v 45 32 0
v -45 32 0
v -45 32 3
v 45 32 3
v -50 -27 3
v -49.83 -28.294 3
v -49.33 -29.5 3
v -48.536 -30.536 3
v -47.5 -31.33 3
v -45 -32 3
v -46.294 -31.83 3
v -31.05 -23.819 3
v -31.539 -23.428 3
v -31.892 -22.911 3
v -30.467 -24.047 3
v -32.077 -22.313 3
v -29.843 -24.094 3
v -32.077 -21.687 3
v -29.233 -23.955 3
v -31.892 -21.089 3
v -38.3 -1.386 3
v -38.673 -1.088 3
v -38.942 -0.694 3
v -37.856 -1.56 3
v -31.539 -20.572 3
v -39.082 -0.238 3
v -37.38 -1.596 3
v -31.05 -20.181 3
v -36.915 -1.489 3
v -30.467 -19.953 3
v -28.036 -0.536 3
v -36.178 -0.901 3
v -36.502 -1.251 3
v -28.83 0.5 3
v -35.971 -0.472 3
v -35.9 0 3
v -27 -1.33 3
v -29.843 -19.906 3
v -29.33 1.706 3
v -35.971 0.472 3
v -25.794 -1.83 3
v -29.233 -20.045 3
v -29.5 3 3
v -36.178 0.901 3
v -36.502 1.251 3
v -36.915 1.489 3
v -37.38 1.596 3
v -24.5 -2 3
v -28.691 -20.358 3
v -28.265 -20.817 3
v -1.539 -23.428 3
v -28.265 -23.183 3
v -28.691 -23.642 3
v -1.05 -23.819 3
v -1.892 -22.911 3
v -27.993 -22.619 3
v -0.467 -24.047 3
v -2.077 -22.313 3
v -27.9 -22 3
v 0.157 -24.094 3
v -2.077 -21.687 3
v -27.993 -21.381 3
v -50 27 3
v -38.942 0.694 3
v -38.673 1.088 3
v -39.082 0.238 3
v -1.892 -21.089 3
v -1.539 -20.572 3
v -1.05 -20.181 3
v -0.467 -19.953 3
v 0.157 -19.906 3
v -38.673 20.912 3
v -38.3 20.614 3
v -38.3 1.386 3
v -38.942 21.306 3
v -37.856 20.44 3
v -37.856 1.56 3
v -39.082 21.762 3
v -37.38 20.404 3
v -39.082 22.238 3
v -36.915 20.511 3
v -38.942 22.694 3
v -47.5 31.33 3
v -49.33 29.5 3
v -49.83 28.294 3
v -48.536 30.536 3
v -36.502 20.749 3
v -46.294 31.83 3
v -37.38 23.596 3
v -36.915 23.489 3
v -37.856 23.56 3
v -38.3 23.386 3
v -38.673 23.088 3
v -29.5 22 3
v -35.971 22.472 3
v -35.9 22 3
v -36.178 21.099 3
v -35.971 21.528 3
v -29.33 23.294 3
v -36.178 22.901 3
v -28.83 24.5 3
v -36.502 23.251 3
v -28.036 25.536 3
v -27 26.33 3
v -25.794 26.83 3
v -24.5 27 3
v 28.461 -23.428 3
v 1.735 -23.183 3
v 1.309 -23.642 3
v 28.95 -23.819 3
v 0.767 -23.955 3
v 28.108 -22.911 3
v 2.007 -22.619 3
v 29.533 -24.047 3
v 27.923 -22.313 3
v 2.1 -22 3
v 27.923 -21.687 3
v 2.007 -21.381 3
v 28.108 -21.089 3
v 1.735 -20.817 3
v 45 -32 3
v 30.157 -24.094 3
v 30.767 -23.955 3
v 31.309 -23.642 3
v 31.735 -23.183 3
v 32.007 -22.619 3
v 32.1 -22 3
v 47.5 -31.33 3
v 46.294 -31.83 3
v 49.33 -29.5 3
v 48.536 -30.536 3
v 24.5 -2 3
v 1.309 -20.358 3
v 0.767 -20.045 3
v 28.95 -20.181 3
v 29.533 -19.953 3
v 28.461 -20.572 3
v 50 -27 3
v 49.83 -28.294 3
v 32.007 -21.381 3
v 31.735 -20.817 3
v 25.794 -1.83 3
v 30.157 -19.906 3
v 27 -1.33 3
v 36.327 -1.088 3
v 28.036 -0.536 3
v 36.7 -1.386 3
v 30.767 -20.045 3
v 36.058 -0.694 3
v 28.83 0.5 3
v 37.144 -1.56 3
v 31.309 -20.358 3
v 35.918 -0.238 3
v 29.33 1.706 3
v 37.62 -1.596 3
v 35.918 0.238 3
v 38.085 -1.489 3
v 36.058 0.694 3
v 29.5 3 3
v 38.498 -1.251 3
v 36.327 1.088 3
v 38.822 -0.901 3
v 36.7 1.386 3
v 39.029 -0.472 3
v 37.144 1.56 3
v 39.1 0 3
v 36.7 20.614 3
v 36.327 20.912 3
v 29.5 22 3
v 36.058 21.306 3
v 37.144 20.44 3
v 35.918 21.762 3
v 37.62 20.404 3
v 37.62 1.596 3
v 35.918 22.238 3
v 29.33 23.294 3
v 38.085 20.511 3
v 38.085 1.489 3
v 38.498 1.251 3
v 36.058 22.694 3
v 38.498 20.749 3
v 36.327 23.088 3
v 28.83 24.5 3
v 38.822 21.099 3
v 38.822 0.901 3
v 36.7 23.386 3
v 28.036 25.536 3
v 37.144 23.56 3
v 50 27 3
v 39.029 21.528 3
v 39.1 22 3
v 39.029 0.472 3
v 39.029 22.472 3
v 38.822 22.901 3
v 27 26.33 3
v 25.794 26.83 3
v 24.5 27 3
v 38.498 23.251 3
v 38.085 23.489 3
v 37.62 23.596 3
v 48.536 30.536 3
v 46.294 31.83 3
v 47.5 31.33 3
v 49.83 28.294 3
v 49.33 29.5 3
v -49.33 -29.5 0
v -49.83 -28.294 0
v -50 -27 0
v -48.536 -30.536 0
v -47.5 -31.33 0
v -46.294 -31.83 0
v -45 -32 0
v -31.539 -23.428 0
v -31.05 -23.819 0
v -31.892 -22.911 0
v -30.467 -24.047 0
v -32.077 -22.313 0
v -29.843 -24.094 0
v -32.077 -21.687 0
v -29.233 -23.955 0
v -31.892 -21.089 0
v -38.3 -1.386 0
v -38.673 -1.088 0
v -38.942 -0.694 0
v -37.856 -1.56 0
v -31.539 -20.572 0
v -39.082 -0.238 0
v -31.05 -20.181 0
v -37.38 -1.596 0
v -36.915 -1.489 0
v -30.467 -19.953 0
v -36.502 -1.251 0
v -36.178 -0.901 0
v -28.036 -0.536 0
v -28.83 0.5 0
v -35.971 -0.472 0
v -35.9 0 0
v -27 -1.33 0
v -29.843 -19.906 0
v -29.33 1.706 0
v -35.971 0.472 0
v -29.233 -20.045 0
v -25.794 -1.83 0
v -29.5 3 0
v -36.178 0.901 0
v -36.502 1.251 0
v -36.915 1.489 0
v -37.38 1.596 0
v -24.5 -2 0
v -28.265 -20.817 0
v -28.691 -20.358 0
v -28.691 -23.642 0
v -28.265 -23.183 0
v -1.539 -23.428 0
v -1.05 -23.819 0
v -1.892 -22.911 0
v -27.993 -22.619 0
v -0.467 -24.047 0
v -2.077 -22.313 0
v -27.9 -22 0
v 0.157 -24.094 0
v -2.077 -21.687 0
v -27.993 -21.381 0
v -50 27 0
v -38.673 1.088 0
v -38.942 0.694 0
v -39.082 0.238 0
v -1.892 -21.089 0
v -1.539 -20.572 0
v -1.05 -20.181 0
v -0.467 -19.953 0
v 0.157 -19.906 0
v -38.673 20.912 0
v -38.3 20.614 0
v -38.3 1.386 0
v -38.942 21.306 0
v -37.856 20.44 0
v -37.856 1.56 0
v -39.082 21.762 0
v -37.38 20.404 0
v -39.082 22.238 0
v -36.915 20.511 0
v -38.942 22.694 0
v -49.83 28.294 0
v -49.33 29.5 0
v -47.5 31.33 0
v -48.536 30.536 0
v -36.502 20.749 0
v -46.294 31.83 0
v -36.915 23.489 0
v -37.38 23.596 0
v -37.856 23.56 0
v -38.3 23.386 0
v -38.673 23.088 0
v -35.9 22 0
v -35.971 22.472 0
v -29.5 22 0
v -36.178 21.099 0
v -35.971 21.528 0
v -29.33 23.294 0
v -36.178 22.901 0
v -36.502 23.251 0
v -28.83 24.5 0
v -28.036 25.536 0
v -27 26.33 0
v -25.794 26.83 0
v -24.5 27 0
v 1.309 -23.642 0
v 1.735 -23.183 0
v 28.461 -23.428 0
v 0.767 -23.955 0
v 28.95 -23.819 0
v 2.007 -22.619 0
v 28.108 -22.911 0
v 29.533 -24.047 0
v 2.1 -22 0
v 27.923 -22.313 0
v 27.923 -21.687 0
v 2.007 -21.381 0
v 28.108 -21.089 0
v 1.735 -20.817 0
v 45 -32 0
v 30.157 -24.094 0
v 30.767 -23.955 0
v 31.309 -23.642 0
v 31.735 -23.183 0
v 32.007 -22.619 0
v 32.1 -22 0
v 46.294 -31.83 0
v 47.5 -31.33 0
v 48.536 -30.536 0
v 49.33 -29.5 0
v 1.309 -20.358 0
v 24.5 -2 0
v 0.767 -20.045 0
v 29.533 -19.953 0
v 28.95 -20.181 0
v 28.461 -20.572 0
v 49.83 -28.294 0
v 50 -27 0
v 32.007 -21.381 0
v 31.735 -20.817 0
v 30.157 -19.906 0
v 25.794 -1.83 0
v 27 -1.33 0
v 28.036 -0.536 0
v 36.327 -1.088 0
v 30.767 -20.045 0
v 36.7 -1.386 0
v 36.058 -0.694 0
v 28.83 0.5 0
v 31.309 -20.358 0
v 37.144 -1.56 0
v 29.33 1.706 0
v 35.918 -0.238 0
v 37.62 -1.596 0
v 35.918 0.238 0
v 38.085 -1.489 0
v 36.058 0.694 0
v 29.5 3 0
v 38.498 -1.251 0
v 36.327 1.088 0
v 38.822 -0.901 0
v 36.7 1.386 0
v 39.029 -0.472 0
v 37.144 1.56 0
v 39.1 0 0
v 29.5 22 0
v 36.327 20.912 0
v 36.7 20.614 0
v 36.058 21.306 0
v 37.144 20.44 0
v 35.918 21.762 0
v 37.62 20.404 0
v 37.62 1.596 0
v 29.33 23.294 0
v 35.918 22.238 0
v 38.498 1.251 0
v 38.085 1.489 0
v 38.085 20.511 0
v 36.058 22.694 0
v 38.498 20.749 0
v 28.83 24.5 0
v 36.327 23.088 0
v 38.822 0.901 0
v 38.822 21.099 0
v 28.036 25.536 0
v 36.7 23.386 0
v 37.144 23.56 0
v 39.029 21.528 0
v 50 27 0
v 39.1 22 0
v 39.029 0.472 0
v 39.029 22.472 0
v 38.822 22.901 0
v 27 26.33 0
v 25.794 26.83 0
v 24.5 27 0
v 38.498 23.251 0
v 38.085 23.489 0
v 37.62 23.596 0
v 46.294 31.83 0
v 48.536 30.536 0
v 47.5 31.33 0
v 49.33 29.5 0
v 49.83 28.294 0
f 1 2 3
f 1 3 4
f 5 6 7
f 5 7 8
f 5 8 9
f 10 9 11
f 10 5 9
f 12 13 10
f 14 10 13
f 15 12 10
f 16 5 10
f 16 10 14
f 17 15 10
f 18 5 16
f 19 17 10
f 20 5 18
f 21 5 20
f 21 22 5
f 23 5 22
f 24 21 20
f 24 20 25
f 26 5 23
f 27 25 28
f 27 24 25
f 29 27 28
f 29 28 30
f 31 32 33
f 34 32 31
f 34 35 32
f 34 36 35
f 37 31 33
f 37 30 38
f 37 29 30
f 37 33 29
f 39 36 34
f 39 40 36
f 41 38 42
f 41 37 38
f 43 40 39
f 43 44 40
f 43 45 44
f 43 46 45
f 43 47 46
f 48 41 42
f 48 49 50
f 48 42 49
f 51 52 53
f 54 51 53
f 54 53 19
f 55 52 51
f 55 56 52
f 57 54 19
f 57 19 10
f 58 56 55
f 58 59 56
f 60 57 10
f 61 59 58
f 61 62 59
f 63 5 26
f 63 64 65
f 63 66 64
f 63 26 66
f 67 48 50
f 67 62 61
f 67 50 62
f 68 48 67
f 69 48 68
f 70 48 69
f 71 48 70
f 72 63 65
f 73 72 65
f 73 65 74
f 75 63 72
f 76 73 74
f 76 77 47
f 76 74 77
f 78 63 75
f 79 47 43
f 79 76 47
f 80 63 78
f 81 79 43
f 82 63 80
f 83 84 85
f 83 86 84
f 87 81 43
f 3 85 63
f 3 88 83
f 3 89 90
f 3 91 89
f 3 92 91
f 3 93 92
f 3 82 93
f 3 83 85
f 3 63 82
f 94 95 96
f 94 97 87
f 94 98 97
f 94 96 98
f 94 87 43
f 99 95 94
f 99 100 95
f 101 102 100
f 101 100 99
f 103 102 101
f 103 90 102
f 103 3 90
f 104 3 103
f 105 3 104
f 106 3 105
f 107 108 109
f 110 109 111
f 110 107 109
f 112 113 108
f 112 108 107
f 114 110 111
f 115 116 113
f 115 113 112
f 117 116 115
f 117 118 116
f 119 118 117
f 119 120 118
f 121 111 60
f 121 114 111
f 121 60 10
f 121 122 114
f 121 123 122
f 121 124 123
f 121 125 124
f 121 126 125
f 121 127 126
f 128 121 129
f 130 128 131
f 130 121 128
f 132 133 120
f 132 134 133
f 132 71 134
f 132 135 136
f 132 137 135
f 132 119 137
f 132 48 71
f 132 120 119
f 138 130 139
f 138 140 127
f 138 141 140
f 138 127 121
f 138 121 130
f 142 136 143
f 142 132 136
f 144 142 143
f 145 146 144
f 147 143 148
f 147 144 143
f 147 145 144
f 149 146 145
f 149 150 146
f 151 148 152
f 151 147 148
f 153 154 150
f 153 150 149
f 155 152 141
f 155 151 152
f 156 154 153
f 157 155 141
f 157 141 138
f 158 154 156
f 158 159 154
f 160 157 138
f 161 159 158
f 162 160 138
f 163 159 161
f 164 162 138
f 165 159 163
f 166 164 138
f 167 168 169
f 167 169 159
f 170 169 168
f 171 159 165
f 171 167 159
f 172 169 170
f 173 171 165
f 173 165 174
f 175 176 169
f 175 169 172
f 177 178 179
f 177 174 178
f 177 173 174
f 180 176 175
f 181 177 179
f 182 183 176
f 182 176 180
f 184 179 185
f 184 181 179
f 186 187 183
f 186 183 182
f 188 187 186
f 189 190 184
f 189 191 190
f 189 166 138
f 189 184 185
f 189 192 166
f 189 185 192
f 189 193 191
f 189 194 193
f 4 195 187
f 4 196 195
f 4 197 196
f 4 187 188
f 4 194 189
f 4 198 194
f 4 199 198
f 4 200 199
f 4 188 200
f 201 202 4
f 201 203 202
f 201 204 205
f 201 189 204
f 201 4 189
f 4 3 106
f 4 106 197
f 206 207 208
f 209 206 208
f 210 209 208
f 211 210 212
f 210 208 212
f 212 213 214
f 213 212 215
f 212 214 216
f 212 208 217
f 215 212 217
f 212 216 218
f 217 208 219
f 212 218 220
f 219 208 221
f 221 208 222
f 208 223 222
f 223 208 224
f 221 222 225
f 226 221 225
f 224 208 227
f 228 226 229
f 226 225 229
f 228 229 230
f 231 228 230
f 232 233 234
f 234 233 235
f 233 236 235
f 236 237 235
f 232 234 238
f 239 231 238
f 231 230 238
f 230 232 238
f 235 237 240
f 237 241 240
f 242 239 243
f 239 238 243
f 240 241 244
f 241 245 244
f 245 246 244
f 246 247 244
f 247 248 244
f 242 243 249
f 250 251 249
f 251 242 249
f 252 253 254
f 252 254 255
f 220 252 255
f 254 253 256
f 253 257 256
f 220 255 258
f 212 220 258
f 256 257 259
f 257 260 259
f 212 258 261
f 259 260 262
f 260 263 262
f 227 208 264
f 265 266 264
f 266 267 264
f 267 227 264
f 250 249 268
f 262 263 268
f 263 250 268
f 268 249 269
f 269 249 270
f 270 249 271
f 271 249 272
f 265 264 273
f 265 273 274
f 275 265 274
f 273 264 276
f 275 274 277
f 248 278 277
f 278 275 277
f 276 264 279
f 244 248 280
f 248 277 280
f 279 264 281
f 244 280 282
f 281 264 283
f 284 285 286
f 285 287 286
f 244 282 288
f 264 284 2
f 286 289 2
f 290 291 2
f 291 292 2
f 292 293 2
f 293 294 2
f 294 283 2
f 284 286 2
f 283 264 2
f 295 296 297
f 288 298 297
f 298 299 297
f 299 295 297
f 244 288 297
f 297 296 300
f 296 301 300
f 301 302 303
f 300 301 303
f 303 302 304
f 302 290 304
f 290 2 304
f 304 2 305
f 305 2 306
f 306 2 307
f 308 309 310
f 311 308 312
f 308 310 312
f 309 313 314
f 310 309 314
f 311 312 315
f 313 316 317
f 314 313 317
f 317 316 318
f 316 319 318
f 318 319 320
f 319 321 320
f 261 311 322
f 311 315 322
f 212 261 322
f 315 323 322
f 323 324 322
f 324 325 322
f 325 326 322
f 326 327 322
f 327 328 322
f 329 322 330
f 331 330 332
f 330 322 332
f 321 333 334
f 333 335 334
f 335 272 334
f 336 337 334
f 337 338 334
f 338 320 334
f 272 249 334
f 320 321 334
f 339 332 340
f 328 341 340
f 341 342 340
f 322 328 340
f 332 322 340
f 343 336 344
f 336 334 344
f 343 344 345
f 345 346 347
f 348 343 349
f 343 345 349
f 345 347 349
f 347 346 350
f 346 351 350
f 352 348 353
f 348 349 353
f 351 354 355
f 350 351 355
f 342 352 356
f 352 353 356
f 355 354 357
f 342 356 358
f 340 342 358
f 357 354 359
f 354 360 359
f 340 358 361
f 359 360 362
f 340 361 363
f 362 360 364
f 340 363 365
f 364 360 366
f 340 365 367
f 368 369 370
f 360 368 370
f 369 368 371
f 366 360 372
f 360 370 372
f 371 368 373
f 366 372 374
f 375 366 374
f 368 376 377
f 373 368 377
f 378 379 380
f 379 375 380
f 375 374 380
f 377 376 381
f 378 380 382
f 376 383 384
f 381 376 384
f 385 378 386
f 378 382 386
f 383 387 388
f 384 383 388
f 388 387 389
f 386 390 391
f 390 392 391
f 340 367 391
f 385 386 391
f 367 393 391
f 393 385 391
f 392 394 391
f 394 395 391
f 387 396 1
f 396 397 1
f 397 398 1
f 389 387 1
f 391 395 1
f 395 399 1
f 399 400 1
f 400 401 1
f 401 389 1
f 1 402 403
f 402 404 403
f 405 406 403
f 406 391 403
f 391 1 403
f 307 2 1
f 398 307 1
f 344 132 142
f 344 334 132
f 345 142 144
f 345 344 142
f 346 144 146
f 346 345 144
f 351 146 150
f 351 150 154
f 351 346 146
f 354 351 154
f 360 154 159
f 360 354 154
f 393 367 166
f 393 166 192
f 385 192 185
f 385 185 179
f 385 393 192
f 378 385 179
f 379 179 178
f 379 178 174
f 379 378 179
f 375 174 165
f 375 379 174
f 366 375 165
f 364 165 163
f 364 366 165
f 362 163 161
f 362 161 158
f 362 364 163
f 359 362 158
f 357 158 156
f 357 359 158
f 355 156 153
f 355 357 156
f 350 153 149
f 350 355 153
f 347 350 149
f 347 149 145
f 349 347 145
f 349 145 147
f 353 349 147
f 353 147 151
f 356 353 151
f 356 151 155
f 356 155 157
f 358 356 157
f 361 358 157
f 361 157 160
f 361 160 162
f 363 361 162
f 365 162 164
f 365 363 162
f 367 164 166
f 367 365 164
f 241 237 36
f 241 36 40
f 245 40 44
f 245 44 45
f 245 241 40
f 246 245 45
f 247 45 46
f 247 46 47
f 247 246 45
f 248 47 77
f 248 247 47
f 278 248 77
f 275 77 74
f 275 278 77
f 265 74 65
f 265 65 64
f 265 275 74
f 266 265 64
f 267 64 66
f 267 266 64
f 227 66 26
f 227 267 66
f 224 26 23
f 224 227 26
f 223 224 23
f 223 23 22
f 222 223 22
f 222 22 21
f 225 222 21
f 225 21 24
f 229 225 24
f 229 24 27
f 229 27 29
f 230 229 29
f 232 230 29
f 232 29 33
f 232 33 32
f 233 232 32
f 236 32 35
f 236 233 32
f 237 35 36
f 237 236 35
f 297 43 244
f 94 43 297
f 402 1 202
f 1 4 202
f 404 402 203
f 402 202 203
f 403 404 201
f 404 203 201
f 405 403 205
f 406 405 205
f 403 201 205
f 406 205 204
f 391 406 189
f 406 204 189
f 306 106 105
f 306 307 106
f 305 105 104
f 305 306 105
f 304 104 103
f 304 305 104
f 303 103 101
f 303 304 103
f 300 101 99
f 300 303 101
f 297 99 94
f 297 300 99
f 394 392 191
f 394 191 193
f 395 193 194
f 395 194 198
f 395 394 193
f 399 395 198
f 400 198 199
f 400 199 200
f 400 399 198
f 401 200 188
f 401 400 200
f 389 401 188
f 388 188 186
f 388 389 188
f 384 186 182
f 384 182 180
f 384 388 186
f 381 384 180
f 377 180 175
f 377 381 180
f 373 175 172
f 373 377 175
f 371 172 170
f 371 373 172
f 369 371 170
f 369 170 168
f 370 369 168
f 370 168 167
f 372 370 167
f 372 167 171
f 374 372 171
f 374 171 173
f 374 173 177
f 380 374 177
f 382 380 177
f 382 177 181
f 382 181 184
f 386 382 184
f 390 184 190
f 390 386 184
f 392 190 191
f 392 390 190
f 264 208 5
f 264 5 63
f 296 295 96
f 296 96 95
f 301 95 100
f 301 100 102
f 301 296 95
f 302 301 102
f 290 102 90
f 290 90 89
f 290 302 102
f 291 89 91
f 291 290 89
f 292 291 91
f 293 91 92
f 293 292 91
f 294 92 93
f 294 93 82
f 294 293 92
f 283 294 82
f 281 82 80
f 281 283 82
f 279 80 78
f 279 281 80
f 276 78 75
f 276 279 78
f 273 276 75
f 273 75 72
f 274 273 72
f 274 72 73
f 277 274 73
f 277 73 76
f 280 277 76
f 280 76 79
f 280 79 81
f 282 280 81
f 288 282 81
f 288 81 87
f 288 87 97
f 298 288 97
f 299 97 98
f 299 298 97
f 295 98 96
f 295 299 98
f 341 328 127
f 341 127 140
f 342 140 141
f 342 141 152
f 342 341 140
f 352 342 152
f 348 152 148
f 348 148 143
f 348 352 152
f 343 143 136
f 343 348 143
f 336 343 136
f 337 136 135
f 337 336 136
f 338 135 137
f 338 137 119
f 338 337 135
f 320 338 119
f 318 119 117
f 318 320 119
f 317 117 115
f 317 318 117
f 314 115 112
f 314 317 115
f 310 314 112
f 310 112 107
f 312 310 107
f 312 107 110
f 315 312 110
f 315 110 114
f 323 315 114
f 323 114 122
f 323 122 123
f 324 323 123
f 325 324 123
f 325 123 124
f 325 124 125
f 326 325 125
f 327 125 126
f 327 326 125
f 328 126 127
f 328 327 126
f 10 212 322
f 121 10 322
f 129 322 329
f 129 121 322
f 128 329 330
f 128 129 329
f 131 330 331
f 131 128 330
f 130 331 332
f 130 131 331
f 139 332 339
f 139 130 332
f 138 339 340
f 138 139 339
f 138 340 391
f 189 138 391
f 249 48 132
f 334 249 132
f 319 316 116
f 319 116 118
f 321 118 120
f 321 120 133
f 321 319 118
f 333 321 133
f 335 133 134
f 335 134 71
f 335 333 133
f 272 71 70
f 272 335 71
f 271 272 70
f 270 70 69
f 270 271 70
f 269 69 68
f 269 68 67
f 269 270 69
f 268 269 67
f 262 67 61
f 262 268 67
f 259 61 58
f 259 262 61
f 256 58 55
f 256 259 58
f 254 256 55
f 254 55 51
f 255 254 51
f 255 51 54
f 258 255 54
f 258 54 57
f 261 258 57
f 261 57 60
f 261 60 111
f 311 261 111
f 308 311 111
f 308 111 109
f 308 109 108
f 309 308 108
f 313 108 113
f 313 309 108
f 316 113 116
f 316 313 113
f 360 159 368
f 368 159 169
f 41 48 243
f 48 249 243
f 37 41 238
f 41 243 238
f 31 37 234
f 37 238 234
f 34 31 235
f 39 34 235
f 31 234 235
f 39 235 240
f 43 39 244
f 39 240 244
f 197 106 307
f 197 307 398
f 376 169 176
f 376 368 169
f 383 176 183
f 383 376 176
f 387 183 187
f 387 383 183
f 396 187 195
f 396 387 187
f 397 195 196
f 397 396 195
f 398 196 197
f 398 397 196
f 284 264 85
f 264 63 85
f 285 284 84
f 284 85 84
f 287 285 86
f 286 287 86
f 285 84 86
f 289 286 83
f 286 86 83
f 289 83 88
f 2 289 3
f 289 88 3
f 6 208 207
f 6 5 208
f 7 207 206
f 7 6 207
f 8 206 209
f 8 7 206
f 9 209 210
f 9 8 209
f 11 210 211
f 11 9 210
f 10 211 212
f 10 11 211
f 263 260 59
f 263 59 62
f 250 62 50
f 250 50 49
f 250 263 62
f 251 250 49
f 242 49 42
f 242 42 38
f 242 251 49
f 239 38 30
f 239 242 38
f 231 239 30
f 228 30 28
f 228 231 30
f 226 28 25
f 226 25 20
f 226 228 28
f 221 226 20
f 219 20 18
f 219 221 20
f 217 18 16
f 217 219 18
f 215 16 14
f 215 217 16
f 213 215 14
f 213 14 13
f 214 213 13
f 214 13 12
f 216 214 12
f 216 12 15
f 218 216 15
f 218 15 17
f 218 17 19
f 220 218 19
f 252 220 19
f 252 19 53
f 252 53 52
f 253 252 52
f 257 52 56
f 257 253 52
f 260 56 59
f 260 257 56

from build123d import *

# Parameters (mm, degrees)
SKETCH_1_W          = 100
SKETCH_1_H          = 64
SKETCH_1_R          = 1.6
SKETCH_1_R_2        = 2.1
EXTRUDE_1_DEPTH     = 3
SKETCH_2_W          = 59
SKETCH_2_H          = 29
CUT_EXTRUDE_1_DEPTH = 10
FILLET_1_R          = 5
FILLET_2_R          = 5


with BuildPart() as part:
    # 草图1 → 凸台-拉伸1 (new body)
    with BuildSketch(Plane.XY):
        Rectangle(SKETCH_1_W, SKETCH_1_H)
        with Locations((-37.5, 0)):
            Circle(SKETCH_1_R, mode=Mode.SUBTRACT)
        with Locations((-37.5, 22)):
            Circle(SKETCH_1_R, mode=Mode.SUBTRACT)
        with Locations((37.5, 0)):
            Circle(SKETCH_1_R, mode=Mode.SUBTRACT)
        with Locations((37.5, 22)):
            Circle(SKETCH_1_R, mode=Mode.SUBTRACT)
        with Locations((-30, -22)):
            Circle(SKETCH_1_R_2, mode=Mode.SUBTRACT)
        with Locations((30, -22)):
            Circle(SKETCH_1_R_2, mode=Mode.SUBTRACT)
        with Locations((0, -22)):
            Circle(SKETCH_1_R_2, mode=Mode.SUBTRACT)
    extrude(amount=EXTRUDE_1_DEPTH)

    # 草图2 → 切除-拉伸1 (cut)
    with BuildSketch(Plane.XY.offset(3)):
        with Locations((0, 12.5)):
            Rectangle(SKETCH_2_W, SKETCH_2_H)
    extrude(amount=-CUT_EXTRUDE_1_DEPTH, mode=Mode.SUBTRACT)

    # 圆角1
    fillet_1_edges = [part.edges().sort_by_distance(p)[0] for p in [
        (29.5, 27, 1.5),
        (29.5, -2, 1.5),
        (-29.5, -2, 1.5),
        (-29.5, 27, 1.5),
    ]]
    fillet(fillet_1_edges, radius=FILLET_1_R)

    # 圆角2
    fillet_2_edges = [part.edges().sort_by_distance(p)[0] for p in [
        (50, -32, 1.5),
        (-50, -32, 1.5),
        (-50, 32, 1.5),
        (50, 32, 1.5),
    ]]
    fillet(fillet_2_edges, radius=FILLET_2_R)


solid = part.part
